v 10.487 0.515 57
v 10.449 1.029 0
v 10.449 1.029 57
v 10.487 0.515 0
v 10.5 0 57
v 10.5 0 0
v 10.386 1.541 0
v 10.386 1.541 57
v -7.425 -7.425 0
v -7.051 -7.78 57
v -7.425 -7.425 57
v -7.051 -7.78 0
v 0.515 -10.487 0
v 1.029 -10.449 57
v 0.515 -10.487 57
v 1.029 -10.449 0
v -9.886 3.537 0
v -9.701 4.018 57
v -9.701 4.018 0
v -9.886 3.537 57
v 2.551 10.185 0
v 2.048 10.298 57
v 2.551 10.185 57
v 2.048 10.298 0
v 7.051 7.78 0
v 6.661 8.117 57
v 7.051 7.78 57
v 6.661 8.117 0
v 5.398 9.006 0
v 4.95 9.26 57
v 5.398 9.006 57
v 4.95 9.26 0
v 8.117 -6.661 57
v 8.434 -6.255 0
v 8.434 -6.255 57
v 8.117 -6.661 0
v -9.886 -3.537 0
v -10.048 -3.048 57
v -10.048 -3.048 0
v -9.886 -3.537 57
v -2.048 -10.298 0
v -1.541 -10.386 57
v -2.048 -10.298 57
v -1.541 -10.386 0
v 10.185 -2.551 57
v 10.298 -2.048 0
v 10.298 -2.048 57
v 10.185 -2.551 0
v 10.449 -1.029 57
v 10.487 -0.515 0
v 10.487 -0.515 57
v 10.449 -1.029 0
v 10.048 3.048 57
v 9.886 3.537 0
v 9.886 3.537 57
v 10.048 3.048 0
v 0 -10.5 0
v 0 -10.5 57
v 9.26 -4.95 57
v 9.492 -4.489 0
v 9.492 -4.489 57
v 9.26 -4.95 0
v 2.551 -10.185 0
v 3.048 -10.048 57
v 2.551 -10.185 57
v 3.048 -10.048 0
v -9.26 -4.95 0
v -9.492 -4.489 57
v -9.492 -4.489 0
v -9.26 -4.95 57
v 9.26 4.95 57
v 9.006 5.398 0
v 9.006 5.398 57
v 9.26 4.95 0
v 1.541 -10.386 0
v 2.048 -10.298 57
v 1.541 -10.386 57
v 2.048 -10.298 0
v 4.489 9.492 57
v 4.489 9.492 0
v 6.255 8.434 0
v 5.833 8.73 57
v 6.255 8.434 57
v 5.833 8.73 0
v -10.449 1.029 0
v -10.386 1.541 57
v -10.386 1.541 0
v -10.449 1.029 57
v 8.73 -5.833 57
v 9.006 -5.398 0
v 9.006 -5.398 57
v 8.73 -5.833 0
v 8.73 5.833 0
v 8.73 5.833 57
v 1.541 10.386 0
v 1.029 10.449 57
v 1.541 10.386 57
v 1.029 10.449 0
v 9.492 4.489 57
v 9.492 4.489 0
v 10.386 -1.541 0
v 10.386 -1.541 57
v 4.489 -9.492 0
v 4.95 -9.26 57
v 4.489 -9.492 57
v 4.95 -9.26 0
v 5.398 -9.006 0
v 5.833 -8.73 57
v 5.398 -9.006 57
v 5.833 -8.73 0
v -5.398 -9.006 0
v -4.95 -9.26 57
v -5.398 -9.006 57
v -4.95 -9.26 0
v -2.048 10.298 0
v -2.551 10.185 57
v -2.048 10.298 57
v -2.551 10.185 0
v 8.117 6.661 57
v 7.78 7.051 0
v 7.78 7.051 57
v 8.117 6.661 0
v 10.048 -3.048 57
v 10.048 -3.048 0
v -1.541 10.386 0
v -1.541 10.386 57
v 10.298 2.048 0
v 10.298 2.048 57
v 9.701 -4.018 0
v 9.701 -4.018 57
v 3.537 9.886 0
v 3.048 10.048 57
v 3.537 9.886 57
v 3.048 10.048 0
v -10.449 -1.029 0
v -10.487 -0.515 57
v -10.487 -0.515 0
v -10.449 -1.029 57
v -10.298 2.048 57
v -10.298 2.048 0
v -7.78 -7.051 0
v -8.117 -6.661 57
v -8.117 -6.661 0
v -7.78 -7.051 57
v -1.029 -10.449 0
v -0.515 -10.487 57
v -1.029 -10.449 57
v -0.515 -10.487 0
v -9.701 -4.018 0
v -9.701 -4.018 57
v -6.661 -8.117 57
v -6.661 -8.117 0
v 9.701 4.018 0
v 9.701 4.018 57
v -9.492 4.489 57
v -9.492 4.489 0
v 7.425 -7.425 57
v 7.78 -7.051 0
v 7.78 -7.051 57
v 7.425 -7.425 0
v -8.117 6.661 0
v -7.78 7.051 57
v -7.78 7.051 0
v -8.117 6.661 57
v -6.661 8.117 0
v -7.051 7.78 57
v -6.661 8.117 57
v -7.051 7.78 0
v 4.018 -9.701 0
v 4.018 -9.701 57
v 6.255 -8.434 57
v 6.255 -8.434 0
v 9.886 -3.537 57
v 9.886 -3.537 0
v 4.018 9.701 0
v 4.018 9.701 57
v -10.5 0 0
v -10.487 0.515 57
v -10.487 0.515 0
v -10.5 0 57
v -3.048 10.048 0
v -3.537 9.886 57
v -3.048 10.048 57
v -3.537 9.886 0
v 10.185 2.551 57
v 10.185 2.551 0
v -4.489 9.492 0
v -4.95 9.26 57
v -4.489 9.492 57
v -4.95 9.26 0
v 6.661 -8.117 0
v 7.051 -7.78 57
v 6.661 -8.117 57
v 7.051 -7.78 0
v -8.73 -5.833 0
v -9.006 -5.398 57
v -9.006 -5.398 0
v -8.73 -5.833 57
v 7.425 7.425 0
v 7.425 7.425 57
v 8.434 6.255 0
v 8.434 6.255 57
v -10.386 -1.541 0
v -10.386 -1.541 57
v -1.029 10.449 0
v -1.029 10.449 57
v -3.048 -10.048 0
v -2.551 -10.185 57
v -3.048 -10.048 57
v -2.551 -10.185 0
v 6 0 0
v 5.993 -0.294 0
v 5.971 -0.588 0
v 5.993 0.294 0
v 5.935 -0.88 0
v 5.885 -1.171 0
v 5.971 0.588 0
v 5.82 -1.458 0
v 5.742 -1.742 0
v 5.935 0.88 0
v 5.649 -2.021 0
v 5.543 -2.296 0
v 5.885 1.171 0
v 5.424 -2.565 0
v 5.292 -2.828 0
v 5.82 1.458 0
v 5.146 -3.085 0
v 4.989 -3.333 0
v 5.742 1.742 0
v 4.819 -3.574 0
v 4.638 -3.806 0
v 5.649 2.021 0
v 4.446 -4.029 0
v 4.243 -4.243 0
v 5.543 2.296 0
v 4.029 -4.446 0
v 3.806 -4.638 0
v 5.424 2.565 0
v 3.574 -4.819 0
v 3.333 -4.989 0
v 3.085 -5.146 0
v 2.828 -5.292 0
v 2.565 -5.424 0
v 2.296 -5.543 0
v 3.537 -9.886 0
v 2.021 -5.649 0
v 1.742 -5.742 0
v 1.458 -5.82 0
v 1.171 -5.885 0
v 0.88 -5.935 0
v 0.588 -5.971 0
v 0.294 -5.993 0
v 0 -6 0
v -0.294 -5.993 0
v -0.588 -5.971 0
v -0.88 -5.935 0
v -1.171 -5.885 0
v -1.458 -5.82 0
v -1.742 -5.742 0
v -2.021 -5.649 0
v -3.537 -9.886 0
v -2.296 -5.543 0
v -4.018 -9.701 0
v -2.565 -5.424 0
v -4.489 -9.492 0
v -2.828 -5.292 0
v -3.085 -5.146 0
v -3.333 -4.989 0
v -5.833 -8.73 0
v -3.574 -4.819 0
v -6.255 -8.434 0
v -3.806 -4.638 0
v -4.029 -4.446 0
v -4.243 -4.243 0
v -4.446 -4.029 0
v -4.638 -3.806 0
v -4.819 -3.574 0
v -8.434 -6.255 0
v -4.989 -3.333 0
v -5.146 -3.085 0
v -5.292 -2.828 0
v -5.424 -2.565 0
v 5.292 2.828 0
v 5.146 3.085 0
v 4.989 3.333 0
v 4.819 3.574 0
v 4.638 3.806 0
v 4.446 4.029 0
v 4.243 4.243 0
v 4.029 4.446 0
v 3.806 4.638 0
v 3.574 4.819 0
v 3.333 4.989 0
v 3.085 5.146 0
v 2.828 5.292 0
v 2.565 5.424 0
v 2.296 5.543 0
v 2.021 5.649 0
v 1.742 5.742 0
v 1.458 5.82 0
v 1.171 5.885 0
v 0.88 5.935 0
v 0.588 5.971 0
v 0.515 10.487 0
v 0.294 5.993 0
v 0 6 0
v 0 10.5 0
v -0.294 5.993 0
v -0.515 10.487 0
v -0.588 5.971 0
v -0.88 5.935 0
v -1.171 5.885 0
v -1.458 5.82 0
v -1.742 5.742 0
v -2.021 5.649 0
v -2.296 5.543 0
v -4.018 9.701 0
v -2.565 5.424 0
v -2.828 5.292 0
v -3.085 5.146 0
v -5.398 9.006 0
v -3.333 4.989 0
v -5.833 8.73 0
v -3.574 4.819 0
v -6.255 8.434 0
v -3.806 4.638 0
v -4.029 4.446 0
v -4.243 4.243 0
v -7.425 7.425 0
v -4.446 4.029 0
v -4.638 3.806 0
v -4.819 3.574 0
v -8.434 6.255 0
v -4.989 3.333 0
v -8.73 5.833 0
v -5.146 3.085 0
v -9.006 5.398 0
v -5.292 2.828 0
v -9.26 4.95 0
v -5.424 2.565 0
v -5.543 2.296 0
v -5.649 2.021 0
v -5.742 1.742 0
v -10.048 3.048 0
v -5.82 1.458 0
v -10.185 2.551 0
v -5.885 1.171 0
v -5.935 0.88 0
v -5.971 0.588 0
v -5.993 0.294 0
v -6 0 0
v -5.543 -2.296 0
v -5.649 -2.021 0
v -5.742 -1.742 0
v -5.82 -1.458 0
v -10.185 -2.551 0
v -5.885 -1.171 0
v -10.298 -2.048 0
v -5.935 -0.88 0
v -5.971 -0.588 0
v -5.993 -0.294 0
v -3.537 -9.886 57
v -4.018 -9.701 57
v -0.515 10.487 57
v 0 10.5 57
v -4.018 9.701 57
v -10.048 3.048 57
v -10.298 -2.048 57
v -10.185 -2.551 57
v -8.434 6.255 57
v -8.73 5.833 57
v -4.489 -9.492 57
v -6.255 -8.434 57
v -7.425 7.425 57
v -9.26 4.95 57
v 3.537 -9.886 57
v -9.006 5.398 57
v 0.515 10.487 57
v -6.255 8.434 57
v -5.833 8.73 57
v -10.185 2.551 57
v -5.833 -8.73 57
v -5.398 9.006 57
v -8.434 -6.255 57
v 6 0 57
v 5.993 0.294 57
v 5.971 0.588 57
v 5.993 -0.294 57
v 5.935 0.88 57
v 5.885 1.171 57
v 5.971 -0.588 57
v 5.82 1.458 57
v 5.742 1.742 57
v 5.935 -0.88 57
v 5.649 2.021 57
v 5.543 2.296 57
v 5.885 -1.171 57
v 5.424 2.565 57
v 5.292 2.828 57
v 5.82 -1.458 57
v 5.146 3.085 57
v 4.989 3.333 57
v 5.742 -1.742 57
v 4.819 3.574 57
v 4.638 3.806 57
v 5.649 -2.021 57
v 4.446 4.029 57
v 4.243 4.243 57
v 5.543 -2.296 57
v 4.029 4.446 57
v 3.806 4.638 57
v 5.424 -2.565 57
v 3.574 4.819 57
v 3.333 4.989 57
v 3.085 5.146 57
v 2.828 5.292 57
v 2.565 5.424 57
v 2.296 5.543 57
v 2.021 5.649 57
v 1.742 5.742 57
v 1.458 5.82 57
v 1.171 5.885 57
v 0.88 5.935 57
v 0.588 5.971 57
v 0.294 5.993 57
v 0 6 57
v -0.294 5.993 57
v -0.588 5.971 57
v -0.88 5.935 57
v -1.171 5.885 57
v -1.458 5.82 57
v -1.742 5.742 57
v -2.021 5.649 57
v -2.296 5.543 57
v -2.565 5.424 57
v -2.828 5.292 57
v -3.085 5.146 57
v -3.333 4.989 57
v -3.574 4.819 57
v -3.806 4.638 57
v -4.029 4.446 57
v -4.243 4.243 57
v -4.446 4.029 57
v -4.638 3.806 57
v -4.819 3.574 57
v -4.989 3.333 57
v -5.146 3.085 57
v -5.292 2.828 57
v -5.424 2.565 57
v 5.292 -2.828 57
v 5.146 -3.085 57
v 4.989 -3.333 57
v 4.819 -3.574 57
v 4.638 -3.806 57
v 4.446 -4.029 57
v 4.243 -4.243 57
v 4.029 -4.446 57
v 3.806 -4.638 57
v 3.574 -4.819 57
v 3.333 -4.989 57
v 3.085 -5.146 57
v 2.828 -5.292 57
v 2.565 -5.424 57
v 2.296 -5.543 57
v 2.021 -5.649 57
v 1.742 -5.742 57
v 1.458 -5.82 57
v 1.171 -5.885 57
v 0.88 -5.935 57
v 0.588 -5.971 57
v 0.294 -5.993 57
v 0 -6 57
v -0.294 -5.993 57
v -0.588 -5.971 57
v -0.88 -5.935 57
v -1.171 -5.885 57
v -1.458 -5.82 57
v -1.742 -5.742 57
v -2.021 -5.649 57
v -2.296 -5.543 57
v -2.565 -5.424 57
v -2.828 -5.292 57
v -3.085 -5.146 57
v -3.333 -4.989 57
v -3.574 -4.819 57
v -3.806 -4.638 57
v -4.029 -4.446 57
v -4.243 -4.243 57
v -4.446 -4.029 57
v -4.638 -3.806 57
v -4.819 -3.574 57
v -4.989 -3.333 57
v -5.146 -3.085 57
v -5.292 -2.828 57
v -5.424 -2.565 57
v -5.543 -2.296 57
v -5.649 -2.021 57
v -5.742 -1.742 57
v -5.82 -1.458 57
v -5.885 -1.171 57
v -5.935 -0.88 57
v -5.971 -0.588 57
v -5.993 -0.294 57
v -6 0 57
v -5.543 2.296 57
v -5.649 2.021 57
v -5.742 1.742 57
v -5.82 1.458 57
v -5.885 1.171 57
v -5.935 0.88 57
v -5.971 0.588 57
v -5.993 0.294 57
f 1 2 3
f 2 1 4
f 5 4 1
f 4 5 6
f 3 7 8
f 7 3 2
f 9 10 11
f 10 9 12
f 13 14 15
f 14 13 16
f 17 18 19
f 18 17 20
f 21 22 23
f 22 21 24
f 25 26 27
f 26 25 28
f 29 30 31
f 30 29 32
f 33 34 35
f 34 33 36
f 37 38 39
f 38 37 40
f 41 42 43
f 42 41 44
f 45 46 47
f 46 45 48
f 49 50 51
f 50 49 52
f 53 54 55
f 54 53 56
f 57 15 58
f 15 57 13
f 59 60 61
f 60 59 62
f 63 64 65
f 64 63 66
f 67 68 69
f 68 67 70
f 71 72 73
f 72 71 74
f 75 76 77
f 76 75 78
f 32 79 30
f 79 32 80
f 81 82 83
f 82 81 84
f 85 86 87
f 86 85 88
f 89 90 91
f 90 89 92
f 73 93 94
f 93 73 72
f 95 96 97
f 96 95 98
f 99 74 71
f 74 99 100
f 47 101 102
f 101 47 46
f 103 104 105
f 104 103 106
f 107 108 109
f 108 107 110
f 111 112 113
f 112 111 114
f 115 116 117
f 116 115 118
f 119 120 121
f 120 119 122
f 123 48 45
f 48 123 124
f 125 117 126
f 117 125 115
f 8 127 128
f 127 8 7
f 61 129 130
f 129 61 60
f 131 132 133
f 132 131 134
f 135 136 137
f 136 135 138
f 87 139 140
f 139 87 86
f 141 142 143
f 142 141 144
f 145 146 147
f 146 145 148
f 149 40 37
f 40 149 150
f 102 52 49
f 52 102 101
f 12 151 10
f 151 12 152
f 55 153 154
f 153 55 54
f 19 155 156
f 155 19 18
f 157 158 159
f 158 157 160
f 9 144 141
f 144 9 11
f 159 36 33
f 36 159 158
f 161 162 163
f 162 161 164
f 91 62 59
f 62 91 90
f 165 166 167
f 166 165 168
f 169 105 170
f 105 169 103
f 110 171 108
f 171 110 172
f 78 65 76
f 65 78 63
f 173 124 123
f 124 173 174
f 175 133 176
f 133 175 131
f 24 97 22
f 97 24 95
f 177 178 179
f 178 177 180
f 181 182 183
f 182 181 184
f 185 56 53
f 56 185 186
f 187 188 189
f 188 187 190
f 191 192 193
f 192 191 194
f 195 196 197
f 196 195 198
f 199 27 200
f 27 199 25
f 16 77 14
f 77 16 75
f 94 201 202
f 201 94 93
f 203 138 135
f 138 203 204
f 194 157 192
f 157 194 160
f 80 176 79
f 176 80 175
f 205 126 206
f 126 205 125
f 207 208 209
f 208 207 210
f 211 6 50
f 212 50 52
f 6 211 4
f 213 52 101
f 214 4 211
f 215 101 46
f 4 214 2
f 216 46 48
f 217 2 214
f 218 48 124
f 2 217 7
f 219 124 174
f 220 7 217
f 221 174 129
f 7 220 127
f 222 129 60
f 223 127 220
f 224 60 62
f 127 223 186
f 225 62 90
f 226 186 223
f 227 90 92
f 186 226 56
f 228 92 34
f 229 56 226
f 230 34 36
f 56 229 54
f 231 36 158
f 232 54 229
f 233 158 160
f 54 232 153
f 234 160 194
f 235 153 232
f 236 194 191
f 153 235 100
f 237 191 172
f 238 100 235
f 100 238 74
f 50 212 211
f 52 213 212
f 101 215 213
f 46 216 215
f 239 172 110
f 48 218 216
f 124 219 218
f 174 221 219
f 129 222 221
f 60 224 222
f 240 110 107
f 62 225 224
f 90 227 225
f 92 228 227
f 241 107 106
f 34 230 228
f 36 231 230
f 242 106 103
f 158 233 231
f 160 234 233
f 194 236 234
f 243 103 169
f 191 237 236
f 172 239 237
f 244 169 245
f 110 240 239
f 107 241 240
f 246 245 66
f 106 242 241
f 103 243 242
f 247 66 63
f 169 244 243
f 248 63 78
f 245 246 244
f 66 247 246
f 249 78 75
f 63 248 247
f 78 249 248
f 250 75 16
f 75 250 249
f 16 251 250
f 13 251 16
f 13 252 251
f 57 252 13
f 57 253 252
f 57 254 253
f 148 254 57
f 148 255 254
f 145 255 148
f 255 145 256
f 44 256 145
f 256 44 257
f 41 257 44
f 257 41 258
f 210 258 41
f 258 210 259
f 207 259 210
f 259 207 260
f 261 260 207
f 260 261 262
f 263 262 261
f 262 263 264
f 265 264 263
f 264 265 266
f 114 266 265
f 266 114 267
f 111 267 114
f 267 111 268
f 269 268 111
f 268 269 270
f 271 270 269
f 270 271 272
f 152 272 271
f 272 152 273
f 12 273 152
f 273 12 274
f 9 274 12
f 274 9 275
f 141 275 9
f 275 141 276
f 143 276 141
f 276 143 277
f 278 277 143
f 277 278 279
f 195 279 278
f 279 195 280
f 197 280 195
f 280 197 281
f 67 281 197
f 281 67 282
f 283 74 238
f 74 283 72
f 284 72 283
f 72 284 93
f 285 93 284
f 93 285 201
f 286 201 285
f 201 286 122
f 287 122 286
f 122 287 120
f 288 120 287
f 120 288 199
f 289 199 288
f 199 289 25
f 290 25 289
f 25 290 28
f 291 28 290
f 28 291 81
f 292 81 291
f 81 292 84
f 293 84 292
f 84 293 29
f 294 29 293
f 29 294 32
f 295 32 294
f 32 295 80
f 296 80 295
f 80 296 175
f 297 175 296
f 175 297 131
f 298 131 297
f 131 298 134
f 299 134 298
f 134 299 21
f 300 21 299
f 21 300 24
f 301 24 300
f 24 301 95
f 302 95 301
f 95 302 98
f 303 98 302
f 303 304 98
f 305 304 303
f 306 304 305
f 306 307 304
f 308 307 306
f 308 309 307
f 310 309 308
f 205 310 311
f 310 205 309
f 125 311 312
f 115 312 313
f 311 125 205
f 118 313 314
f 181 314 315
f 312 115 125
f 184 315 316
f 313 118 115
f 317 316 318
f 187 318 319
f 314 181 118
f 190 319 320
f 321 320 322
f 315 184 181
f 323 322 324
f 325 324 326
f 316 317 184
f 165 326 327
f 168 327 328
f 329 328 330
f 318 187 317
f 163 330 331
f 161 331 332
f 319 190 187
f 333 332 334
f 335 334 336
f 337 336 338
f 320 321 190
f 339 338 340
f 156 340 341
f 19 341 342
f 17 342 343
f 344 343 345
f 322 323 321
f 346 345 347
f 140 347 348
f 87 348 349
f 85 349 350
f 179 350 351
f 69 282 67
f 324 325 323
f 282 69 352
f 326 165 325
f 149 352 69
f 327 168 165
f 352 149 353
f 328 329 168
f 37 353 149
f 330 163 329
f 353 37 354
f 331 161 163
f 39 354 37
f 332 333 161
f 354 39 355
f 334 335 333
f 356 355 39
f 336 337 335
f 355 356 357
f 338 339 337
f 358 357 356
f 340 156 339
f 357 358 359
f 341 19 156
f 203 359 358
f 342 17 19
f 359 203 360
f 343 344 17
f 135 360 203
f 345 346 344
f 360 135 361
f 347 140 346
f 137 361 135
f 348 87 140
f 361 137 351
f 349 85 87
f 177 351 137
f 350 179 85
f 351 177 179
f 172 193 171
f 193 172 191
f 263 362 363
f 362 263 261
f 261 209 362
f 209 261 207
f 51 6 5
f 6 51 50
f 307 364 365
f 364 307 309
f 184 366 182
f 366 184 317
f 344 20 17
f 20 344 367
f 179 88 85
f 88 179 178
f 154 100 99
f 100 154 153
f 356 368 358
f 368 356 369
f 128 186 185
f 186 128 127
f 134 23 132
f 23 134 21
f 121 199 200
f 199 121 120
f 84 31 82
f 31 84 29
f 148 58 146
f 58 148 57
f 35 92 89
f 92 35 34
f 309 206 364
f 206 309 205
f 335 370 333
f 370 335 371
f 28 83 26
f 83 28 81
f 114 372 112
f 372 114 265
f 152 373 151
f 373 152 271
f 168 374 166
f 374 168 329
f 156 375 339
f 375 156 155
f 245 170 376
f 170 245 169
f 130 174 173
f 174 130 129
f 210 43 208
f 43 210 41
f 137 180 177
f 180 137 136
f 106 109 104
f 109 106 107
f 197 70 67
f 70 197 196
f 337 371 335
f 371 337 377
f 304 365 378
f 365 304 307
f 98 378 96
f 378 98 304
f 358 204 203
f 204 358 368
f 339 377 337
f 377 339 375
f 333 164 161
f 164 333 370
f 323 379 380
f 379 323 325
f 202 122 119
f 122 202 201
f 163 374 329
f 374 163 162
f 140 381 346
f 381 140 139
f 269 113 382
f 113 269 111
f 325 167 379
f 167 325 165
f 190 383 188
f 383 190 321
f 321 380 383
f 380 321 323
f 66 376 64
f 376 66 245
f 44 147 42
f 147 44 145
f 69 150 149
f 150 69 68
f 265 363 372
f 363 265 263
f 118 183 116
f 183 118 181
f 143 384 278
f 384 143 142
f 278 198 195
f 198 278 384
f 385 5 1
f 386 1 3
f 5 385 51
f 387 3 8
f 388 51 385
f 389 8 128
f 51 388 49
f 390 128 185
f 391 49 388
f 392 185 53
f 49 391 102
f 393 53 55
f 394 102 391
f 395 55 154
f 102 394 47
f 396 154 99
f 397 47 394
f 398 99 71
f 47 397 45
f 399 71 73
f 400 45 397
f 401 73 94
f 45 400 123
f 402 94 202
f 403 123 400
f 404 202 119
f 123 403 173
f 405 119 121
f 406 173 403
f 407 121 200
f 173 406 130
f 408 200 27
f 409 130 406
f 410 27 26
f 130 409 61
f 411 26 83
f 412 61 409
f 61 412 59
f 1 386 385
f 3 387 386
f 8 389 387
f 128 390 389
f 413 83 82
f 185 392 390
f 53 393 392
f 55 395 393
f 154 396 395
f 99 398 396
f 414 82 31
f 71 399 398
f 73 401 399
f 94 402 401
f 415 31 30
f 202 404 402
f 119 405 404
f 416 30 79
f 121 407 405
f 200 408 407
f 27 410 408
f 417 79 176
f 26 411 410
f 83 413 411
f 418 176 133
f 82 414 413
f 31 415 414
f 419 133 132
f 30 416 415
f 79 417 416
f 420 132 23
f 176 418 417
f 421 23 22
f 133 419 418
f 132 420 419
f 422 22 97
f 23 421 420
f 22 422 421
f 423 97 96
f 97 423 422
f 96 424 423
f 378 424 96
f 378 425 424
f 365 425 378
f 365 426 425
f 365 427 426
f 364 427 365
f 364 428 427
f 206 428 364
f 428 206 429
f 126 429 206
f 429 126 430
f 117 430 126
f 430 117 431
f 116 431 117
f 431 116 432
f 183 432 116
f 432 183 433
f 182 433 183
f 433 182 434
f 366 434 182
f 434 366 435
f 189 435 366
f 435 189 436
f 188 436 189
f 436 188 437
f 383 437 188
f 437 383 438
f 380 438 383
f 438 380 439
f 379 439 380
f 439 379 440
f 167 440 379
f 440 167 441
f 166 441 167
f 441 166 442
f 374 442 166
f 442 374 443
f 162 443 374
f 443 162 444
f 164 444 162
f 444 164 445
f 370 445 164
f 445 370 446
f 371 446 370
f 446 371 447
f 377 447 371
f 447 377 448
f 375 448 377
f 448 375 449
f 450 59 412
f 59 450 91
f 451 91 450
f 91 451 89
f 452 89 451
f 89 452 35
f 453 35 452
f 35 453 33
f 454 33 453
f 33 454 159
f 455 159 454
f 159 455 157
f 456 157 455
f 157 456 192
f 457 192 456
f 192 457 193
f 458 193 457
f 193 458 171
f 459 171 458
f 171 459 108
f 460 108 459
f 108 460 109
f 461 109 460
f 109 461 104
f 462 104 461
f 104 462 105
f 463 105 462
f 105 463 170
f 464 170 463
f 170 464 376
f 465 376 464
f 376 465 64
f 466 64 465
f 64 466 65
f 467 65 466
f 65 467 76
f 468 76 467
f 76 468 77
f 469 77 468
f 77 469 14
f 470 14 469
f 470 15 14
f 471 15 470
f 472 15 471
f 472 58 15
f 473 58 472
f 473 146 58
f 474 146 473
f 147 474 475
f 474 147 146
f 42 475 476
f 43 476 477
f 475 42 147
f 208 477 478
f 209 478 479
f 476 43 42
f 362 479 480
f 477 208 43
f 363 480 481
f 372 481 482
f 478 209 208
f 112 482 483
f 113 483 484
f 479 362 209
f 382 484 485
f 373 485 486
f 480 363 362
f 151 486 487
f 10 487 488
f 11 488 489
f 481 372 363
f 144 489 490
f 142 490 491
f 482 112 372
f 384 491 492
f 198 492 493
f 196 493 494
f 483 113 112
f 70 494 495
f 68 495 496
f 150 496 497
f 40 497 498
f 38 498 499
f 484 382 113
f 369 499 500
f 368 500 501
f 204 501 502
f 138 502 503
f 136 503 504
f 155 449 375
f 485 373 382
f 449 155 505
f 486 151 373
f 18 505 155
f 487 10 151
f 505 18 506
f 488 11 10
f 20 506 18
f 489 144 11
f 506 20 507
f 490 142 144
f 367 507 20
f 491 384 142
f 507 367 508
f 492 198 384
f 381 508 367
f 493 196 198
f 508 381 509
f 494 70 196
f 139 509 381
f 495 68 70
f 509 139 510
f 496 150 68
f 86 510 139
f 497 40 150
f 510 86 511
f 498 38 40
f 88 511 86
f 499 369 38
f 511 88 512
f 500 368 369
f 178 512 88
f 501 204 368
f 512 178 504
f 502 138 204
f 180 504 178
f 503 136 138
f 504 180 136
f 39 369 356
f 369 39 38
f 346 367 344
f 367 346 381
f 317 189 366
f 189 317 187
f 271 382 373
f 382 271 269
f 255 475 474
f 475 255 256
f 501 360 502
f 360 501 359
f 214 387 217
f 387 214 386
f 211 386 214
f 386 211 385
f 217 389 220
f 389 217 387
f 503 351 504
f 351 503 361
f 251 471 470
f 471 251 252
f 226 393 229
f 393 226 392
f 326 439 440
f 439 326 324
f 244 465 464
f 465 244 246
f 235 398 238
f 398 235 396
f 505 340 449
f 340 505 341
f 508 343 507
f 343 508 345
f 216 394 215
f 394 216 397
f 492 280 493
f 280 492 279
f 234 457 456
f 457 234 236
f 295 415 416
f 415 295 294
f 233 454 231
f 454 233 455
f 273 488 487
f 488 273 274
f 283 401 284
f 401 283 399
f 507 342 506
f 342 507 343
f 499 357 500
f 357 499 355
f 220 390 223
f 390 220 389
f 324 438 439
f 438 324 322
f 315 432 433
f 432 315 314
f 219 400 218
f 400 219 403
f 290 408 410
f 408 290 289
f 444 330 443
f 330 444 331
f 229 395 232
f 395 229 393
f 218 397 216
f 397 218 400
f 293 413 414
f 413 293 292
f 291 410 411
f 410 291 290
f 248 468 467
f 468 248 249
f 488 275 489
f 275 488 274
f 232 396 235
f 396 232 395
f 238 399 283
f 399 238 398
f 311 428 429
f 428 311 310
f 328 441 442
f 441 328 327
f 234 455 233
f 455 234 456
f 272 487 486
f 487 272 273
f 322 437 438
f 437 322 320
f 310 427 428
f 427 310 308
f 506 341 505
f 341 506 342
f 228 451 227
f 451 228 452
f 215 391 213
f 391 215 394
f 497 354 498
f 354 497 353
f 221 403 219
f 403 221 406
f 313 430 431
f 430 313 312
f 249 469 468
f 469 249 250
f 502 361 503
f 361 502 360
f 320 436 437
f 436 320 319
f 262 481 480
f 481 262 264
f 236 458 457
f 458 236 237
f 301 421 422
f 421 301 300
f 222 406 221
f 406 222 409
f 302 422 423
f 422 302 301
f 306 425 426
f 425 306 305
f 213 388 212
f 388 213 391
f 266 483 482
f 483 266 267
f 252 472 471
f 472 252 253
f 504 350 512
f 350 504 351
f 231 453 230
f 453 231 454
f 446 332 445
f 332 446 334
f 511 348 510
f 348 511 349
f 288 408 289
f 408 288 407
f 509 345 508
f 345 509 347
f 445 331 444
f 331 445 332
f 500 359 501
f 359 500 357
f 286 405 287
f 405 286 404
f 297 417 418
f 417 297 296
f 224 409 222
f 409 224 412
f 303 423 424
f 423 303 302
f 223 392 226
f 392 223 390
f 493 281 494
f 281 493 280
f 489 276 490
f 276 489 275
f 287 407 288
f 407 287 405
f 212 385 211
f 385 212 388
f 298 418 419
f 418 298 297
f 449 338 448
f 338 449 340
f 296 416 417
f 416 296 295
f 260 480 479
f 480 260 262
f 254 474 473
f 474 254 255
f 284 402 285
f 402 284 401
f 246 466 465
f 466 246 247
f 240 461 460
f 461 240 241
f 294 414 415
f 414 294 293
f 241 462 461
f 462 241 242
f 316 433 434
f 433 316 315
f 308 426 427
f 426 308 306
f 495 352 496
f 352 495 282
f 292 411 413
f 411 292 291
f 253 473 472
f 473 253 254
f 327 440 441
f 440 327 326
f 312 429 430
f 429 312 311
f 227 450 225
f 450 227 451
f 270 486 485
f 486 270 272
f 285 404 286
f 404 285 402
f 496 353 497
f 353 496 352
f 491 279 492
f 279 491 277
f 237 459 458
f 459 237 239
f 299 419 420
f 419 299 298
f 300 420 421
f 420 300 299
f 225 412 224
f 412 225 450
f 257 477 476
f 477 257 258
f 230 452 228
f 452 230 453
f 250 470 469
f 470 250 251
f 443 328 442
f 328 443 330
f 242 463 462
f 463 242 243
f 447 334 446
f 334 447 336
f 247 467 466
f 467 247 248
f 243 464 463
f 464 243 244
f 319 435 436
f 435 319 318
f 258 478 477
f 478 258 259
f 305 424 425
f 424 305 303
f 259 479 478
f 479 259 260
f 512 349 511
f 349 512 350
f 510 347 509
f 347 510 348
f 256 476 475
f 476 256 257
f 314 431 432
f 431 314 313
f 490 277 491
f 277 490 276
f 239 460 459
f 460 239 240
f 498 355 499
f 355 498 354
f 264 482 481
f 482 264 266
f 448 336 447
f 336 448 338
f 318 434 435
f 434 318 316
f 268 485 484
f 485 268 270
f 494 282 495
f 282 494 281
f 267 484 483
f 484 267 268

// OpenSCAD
$fn = 128;

bore_d = 12.0;
od_d   = 21.0;
len    = 57.0;

difference() {
  cylinder(d = od_d, h = len, center = false);
  translate([0,0,-0.1]) cylinder(d = bore_d, h = len + 0.2, center = false);
}
